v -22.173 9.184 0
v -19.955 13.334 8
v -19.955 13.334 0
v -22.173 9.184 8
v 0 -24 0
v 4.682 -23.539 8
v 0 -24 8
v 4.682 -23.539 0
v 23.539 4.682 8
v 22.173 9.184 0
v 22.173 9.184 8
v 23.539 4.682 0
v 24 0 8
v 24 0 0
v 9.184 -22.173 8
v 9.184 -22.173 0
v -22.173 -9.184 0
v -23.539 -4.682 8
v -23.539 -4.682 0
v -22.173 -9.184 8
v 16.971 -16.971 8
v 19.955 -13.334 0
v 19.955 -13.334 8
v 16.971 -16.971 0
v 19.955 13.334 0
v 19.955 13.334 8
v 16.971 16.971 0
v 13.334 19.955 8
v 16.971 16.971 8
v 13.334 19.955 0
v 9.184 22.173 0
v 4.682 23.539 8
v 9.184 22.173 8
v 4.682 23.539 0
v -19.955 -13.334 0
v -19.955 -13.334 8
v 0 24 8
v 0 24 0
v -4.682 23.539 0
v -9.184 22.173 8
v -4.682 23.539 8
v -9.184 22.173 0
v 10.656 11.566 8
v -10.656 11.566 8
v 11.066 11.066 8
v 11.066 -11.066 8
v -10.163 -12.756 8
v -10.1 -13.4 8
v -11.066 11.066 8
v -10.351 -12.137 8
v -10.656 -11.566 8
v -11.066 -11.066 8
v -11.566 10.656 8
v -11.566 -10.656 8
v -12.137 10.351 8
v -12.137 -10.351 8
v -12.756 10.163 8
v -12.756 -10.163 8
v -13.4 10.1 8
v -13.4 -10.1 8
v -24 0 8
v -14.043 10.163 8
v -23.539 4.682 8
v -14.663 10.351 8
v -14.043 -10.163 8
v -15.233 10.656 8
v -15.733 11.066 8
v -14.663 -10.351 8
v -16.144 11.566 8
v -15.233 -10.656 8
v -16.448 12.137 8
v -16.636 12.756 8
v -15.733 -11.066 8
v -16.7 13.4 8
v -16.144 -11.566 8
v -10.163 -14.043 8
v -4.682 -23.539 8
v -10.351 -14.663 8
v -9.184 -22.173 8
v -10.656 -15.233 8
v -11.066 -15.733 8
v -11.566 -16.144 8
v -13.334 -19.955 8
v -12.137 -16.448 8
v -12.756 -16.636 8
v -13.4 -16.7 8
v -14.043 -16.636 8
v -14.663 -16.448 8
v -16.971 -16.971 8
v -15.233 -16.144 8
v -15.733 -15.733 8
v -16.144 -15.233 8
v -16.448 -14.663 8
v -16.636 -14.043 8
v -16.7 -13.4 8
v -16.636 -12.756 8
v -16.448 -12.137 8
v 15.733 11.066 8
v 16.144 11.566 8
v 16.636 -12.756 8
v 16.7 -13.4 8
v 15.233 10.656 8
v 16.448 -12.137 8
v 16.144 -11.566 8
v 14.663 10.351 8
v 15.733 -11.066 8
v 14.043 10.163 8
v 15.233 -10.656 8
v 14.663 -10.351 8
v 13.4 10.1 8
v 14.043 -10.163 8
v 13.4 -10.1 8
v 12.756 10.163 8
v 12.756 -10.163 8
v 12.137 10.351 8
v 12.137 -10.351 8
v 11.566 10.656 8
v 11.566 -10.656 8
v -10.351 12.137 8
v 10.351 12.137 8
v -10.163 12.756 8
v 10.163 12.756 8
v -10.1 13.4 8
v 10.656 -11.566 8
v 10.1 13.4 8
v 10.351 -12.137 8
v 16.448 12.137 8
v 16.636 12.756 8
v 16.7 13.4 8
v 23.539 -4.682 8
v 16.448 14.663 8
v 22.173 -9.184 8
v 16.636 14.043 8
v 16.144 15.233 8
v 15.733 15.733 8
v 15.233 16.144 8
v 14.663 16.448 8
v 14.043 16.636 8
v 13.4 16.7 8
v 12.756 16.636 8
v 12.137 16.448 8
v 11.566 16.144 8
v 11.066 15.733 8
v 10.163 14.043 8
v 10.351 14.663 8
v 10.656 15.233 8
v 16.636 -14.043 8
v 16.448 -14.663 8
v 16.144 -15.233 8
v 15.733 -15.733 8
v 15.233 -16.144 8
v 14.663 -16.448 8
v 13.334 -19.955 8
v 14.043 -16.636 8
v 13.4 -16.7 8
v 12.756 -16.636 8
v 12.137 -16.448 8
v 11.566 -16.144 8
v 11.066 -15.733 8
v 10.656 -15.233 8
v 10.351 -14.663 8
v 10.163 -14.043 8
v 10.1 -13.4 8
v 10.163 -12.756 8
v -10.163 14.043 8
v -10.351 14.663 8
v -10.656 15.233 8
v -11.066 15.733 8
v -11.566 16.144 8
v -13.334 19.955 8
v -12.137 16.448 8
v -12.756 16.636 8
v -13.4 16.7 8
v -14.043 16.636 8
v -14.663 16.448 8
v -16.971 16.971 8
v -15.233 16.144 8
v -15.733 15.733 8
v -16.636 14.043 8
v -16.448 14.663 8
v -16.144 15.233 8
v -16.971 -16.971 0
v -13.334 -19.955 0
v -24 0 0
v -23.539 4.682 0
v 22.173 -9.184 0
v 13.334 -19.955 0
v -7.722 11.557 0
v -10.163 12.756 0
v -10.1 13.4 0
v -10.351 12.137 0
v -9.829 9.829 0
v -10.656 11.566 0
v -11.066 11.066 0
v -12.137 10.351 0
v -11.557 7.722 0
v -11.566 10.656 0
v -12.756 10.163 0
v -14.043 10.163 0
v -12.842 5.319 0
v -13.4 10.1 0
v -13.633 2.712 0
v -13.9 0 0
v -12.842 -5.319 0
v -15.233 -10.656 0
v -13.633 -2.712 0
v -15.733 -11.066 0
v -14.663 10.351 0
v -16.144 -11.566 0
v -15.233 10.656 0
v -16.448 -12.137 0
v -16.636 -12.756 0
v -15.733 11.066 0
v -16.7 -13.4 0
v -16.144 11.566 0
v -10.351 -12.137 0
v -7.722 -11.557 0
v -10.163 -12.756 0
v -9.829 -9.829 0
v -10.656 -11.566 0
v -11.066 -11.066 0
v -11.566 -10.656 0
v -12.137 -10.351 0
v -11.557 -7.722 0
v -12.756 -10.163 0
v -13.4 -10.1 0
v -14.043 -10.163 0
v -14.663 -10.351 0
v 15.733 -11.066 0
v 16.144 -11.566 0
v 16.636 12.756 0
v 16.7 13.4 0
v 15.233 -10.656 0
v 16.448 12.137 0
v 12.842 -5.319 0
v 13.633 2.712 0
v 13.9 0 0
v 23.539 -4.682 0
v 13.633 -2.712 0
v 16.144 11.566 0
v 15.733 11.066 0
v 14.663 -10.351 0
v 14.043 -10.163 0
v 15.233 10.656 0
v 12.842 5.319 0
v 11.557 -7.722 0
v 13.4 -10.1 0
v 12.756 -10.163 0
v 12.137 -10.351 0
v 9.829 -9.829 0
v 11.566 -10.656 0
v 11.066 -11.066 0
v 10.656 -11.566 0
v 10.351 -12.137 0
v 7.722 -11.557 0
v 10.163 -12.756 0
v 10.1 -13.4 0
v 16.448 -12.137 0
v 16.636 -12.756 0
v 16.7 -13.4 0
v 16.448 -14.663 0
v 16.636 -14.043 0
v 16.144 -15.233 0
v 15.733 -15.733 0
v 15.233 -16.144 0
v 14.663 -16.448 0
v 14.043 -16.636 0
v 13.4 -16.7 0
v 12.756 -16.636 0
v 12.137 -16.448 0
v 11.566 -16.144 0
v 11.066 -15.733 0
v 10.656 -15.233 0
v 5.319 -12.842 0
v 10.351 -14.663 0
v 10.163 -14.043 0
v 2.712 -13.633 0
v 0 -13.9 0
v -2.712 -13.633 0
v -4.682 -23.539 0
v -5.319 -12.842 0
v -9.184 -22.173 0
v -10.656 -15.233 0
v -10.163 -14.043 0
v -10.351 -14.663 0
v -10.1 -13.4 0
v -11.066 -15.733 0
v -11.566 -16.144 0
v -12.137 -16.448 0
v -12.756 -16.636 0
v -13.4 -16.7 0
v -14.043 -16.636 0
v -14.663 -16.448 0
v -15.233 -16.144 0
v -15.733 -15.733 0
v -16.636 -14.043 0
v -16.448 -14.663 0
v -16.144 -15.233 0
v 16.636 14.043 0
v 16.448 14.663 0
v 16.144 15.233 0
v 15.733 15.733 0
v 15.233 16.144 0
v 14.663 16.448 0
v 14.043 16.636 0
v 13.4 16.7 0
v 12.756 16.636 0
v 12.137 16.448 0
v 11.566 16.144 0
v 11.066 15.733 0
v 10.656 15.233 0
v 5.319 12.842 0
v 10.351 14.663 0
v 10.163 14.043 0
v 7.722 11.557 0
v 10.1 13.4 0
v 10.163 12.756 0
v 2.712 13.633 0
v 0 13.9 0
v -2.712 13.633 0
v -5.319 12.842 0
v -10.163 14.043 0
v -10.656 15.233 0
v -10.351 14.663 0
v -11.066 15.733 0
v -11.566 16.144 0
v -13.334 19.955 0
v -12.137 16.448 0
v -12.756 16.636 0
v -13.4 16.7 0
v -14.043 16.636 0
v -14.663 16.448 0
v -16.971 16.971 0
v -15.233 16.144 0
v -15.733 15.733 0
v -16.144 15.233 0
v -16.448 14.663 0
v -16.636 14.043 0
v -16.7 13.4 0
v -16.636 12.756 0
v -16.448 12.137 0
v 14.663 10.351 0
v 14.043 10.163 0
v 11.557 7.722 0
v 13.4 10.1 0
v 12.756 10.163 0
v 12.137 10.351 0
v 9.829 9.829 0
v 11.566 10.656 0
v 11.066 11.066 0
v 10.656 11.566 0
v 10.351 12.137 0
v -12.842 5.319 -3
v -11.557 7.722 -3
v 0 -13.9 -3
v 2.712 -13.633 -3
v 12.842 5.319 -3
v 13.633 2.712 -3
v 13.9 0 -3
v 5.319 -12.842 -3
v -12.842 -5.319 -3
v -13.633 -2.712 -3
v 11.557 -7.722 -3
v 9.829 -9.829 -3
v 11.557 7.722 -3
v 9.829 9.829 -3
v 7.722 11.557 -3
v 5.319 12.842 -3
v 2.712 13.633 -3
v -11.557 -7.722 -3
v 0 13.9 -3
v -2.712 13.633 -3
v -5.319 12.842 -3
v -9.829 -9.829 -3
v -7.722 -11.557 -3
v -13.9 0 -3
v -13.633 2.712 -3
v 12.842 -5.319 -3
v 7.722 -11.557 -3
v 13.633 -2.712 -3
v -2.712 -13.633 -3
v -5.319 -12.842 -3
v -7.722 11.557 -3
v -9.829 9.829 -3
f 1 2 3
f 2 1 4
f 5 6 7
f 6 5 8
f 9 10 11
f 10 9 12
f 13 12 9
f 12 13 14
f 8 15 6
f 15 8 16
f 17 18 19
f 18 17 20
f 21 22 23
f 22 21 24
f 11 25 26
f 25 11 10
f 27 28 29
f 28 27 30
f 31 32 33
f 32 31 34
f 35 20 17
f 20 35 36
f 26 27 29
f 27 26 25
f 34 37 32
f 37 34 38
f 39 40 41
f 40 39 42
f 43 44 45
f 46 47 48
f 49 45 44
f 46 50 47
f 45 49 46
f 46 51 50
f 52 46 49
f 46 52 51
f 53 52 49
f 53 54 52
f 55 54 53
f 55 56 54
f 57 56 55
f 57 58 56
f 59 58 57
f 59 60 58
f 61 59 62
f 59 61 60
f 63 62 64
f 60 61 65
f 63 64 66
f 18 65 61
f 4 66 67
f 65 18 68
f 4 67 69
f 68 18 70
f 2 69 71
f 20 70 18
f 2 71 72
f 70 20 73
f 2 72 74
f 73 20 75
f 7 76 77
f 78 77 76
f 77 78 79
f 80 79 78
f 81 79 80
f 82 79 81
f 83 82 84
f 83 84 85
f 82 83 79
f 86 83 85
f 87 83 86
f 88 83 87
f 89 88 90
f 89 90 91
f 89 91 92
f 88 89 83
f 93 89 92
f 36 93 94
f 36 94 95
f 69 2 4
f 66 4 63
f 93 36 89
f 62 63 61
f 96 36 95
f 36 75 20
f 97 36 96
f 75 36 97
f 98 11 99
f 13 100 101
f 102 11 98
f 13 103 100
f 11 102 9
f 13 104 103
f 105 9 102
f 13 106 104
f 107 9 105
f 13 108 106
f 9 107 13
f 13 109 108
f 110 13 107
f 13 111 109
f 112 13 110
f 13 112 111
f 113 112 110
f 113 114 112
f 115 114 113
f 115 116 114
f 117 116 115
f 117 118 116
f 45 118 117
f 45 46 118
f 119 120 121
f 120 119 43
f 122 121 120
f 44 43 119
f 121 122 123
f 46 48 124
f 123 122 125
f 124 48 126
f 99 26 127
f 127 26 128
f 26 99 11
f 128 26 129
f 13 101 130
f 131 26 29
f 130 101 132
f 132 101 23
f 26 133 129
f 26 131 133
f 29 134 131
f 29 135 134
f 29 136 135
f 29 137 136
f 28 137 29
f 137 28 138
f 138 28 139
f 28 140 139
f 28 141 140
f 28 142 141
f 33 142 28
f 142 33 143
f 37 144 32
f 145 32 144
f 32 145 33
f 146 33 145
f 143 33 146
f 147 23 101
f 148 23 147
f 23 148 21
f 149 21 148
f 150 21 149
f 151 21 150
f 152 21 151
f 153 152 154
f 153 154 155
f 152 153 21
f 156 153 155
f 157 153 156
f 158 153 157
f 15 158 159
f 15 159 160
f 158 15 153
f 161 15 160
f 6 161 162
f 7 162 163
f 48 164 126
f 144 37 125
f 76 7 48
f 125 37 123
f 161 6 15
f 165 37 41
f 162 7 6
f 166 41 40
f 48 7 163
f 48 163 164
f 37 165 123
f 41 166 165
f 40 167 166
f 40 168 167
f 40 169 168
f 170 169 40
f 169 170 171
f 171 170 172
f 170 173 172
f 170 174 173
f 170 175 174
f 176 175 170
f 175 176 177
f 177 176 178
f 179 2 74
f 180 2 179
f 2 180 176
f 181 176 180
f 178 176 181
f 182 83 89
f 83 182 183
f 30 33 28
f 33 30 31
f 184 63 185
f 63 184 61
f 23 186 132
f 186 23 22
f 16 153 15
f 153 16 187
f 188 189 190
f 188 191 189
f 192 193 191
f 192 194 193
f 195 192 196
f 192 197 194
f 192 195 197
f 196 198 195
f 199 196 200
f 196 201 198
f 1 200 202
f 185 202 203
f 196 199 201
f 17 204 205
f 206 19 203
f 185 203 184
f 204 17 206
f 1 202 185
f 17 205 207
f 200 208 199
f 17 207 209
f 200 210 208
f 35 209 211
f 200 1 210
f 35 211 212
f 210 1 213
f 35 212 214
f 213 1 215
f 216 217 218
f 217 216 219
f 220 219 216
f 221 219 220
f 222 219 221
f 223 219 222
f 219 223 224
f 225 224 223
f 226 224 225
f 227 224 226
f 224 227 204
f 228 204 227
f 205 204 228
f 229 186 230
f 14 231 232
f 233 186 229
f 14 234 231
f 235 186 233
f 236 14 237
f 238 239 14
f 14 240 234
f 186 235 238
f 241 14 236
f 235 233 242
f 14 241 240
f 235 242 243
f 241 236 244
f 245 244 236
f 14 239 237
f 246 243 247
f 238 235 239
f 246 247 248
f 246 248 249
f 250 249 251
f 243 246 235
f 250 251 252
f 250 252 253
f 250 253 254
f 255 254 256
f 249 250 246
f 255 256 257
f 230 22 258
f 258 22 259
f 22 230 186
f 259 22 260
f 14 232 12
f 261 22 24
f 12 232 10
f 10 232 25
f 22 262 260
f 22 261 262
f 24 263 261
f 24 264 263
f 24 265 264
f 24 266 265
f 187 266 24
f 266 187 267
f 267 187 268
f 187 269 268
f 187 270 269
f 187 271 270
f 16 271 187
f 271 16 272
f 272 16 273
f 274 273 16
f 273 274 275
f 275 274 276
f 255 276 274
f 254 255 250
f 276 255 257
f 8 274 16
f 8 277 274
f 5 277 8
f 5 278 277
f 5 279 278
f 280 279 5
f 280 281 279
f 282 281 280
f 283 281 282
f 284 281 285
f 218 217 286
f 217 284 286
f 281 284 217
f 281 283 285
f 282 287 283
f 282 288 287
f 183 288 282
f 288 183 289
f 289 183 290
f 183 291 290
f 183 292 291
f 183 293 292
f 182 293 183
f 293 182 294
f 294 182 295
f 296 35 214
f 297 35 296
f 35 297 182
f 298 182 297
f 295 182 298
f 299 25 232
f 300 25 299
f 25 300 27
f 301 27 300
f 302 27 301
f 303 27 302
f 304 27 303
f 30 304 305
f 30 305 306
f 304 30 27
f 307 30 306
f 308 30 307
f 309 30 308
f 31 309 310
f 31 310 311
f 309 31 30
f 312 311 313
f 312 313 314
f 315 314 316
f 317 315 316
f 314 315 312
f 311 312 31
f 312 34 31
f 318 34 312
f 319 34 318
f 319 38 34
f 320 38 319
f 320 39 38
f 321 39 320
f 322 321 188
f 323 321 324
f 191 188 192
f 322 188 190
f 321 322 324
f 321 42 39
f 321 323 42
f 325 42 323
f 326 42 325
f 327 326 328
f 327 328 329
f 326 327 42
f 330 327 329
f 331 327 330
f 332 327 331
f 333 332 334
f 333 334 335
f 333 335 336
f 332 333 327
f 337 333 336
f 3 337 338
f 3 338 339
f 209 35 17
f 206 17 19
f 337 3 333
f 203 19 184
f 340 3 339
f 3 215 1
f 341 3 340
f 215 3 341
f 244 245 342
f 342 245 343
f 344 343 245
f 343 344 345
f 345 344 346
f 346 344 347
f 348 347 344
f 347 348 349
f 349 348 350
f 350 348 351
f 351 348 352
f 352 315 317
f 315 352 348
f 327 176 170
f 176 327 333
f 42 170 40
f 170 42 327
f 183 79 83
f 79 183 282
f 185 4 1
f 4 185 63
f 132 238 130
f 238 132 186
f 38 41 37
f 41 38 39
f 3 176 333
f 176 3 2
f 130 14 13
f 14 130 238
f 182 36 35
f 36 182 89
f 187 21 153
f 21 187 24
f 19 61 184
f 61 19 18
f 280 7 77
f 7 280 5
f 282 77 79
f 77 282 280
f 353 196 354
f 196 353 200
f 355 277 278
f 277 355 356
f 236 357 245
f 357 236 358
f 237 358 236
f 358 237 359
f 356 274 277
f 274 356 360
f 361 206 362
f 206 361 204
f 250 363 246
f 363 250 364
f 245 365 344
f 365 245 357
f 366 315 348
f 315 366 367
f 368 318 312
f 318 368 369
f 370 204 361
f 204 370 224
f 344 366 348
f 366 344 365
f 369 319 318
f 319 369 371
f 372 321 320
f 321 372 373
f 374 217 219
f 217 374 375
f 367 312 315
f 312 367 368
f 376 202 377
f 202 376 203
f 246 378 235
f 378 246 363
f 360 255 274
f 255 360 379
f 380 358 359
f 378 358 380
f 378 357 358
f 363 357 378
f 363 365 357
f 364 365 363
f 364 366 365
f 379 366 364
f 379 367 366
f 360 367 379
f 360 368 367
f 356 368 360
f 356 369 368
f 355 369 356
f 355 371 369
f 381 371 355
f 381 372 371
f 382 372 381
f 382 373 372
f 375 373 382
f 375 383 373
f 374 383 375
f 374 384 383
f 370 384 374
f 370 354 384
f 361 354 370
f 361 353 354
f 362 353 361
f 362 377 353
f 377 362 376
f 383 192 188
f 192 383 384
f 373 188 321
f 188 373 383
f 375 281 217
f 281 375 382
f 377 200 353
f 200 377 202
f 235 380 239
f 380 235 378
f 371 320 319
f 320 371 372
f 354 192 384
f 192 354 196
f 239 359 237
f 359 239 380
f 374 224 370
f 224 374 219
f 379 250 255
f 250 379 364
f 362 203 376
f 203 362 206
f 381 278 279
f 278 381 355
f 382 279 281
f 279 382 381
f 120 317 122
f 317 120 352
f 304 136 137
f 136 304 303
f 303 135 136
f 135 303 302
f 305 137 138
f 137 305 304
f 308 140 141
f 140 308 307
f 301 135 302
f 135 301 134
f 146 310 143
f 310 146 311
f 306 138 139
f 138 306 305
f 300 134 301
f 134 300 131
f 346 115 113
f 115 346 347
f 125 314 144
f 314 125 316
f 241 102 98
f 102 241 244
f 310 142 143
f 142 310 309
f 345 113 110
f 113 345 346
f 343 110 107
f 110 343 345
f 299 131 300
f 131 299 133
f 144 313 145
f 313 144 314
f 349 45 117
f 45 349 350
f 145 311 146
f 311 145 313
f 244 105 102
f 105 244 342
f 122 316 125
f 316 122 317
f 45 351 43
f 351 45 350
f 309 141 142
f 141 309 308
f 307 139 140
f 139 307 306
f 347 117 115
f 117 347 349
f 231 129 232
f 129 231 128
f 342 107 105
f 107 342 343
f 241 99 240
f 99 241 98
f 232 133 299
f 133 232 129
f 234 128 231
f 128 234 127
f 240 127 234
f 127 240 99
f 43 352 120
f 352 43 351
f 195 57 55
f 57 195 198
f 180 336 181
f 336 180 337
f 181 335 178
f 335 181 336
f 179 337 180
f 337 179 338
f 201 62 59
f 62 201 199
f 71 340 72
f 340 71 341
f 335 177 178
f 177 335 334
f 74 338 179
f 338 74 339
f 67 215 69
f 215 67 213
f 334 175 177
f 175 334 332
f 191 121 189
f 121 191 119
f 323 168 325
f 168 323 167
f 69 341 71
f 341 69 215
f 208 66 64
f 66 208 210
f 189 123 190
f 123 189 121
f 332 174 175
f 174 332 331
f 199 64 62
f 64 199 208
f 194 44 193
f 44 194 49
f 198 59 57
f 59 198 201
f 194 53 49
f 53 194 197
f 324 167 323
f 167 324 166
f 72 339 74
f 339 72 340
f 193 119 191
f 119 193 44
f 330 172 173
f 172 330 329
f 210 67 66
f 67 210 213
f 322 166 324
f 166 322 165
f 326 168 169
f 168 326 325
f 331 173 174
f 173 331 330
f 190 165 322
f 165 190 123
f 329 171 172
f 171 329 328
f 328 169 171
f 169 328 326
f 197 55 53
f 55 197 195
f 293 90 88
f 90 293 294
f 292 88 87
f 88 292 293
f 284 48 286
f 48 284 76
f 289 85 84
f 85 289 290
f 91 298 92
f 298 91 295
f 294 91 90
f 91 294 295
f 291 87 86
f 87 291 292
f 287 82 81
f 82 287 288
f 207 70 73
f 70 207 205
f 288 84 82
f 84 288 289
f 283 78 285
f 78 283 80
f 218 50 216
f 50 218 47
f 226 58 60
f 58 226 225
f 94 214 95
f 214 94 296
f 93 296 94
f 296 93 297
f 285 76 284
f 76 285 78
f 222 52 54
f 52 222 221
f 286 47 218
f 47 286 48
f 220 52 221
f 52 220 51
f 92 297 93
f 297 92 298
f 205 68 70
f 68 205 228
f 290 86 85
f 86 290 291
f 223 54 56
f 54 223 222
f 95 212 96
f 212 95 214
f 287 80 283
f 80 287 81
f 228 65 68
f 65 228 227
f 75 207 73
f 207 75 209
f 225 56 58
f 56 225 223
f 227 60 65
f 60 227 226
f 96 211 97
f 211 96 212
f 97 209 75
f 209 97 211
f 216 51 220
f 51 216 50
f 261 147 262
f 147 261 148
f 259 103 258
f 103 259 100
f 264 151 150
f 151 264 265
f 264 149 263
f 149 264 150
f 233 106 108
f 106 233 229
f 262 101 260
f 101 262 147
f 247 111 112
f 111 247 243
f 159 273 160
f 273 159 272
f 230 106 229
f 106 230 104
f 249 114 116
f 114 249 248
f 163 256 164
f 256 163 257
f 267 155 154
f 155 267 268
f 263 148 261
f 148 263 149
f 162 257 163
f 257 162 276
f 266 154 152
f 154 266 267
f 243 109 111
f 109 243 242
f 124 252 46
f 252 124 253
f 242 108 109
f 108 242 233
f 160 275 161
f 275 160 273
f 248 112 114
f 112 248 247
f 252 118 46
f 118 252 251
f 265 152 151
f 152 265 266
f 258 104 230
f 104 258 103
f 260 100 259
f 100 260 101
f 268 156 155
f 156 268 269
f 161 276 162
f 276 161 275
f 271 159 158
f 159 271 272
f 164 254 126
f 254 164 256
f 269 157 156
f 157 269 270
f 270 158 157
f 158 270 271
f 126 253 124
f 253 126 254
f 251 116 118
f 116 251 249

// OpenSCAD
$fn = 32;

// ----------------------------------------------------------------------
// Retaining cap: 6001 cover, 48 mm, spigot 27.8 mm
// ----------------------------------------------------------------------

// --- parameters (mm) ---
cover_d = 48;             // cover diameter
cover_t = 8;              // cover thickness
spigot_d = 27.8;          // spigot that enters the housing
spigot_h = 3;             // spigot height
bolt_d = 6.6;             // bolt clearance
bolt_r = 18.95;           // bolt circle radius

module cover() {
  cylinder(h = cover_t, d = cover_d);
}

module spigot() {
  /* sunk 1 mm into the cover; the spigot sets the overall height */
  translate([0, 0, -spigot_h]) cylinder(h = spigot_h + 1, d = spigot_d);
}

difference() {
  union() {
    cover();
    spigot();
  }
  for (i = [0 : 3]) rotate([0, 0, 45 + i * 90]) translate([bolt_r, 0, -spigot_h - 1])
    cylinder(h = spigot_h + cover_t + 2, d = bolt_d);
}
